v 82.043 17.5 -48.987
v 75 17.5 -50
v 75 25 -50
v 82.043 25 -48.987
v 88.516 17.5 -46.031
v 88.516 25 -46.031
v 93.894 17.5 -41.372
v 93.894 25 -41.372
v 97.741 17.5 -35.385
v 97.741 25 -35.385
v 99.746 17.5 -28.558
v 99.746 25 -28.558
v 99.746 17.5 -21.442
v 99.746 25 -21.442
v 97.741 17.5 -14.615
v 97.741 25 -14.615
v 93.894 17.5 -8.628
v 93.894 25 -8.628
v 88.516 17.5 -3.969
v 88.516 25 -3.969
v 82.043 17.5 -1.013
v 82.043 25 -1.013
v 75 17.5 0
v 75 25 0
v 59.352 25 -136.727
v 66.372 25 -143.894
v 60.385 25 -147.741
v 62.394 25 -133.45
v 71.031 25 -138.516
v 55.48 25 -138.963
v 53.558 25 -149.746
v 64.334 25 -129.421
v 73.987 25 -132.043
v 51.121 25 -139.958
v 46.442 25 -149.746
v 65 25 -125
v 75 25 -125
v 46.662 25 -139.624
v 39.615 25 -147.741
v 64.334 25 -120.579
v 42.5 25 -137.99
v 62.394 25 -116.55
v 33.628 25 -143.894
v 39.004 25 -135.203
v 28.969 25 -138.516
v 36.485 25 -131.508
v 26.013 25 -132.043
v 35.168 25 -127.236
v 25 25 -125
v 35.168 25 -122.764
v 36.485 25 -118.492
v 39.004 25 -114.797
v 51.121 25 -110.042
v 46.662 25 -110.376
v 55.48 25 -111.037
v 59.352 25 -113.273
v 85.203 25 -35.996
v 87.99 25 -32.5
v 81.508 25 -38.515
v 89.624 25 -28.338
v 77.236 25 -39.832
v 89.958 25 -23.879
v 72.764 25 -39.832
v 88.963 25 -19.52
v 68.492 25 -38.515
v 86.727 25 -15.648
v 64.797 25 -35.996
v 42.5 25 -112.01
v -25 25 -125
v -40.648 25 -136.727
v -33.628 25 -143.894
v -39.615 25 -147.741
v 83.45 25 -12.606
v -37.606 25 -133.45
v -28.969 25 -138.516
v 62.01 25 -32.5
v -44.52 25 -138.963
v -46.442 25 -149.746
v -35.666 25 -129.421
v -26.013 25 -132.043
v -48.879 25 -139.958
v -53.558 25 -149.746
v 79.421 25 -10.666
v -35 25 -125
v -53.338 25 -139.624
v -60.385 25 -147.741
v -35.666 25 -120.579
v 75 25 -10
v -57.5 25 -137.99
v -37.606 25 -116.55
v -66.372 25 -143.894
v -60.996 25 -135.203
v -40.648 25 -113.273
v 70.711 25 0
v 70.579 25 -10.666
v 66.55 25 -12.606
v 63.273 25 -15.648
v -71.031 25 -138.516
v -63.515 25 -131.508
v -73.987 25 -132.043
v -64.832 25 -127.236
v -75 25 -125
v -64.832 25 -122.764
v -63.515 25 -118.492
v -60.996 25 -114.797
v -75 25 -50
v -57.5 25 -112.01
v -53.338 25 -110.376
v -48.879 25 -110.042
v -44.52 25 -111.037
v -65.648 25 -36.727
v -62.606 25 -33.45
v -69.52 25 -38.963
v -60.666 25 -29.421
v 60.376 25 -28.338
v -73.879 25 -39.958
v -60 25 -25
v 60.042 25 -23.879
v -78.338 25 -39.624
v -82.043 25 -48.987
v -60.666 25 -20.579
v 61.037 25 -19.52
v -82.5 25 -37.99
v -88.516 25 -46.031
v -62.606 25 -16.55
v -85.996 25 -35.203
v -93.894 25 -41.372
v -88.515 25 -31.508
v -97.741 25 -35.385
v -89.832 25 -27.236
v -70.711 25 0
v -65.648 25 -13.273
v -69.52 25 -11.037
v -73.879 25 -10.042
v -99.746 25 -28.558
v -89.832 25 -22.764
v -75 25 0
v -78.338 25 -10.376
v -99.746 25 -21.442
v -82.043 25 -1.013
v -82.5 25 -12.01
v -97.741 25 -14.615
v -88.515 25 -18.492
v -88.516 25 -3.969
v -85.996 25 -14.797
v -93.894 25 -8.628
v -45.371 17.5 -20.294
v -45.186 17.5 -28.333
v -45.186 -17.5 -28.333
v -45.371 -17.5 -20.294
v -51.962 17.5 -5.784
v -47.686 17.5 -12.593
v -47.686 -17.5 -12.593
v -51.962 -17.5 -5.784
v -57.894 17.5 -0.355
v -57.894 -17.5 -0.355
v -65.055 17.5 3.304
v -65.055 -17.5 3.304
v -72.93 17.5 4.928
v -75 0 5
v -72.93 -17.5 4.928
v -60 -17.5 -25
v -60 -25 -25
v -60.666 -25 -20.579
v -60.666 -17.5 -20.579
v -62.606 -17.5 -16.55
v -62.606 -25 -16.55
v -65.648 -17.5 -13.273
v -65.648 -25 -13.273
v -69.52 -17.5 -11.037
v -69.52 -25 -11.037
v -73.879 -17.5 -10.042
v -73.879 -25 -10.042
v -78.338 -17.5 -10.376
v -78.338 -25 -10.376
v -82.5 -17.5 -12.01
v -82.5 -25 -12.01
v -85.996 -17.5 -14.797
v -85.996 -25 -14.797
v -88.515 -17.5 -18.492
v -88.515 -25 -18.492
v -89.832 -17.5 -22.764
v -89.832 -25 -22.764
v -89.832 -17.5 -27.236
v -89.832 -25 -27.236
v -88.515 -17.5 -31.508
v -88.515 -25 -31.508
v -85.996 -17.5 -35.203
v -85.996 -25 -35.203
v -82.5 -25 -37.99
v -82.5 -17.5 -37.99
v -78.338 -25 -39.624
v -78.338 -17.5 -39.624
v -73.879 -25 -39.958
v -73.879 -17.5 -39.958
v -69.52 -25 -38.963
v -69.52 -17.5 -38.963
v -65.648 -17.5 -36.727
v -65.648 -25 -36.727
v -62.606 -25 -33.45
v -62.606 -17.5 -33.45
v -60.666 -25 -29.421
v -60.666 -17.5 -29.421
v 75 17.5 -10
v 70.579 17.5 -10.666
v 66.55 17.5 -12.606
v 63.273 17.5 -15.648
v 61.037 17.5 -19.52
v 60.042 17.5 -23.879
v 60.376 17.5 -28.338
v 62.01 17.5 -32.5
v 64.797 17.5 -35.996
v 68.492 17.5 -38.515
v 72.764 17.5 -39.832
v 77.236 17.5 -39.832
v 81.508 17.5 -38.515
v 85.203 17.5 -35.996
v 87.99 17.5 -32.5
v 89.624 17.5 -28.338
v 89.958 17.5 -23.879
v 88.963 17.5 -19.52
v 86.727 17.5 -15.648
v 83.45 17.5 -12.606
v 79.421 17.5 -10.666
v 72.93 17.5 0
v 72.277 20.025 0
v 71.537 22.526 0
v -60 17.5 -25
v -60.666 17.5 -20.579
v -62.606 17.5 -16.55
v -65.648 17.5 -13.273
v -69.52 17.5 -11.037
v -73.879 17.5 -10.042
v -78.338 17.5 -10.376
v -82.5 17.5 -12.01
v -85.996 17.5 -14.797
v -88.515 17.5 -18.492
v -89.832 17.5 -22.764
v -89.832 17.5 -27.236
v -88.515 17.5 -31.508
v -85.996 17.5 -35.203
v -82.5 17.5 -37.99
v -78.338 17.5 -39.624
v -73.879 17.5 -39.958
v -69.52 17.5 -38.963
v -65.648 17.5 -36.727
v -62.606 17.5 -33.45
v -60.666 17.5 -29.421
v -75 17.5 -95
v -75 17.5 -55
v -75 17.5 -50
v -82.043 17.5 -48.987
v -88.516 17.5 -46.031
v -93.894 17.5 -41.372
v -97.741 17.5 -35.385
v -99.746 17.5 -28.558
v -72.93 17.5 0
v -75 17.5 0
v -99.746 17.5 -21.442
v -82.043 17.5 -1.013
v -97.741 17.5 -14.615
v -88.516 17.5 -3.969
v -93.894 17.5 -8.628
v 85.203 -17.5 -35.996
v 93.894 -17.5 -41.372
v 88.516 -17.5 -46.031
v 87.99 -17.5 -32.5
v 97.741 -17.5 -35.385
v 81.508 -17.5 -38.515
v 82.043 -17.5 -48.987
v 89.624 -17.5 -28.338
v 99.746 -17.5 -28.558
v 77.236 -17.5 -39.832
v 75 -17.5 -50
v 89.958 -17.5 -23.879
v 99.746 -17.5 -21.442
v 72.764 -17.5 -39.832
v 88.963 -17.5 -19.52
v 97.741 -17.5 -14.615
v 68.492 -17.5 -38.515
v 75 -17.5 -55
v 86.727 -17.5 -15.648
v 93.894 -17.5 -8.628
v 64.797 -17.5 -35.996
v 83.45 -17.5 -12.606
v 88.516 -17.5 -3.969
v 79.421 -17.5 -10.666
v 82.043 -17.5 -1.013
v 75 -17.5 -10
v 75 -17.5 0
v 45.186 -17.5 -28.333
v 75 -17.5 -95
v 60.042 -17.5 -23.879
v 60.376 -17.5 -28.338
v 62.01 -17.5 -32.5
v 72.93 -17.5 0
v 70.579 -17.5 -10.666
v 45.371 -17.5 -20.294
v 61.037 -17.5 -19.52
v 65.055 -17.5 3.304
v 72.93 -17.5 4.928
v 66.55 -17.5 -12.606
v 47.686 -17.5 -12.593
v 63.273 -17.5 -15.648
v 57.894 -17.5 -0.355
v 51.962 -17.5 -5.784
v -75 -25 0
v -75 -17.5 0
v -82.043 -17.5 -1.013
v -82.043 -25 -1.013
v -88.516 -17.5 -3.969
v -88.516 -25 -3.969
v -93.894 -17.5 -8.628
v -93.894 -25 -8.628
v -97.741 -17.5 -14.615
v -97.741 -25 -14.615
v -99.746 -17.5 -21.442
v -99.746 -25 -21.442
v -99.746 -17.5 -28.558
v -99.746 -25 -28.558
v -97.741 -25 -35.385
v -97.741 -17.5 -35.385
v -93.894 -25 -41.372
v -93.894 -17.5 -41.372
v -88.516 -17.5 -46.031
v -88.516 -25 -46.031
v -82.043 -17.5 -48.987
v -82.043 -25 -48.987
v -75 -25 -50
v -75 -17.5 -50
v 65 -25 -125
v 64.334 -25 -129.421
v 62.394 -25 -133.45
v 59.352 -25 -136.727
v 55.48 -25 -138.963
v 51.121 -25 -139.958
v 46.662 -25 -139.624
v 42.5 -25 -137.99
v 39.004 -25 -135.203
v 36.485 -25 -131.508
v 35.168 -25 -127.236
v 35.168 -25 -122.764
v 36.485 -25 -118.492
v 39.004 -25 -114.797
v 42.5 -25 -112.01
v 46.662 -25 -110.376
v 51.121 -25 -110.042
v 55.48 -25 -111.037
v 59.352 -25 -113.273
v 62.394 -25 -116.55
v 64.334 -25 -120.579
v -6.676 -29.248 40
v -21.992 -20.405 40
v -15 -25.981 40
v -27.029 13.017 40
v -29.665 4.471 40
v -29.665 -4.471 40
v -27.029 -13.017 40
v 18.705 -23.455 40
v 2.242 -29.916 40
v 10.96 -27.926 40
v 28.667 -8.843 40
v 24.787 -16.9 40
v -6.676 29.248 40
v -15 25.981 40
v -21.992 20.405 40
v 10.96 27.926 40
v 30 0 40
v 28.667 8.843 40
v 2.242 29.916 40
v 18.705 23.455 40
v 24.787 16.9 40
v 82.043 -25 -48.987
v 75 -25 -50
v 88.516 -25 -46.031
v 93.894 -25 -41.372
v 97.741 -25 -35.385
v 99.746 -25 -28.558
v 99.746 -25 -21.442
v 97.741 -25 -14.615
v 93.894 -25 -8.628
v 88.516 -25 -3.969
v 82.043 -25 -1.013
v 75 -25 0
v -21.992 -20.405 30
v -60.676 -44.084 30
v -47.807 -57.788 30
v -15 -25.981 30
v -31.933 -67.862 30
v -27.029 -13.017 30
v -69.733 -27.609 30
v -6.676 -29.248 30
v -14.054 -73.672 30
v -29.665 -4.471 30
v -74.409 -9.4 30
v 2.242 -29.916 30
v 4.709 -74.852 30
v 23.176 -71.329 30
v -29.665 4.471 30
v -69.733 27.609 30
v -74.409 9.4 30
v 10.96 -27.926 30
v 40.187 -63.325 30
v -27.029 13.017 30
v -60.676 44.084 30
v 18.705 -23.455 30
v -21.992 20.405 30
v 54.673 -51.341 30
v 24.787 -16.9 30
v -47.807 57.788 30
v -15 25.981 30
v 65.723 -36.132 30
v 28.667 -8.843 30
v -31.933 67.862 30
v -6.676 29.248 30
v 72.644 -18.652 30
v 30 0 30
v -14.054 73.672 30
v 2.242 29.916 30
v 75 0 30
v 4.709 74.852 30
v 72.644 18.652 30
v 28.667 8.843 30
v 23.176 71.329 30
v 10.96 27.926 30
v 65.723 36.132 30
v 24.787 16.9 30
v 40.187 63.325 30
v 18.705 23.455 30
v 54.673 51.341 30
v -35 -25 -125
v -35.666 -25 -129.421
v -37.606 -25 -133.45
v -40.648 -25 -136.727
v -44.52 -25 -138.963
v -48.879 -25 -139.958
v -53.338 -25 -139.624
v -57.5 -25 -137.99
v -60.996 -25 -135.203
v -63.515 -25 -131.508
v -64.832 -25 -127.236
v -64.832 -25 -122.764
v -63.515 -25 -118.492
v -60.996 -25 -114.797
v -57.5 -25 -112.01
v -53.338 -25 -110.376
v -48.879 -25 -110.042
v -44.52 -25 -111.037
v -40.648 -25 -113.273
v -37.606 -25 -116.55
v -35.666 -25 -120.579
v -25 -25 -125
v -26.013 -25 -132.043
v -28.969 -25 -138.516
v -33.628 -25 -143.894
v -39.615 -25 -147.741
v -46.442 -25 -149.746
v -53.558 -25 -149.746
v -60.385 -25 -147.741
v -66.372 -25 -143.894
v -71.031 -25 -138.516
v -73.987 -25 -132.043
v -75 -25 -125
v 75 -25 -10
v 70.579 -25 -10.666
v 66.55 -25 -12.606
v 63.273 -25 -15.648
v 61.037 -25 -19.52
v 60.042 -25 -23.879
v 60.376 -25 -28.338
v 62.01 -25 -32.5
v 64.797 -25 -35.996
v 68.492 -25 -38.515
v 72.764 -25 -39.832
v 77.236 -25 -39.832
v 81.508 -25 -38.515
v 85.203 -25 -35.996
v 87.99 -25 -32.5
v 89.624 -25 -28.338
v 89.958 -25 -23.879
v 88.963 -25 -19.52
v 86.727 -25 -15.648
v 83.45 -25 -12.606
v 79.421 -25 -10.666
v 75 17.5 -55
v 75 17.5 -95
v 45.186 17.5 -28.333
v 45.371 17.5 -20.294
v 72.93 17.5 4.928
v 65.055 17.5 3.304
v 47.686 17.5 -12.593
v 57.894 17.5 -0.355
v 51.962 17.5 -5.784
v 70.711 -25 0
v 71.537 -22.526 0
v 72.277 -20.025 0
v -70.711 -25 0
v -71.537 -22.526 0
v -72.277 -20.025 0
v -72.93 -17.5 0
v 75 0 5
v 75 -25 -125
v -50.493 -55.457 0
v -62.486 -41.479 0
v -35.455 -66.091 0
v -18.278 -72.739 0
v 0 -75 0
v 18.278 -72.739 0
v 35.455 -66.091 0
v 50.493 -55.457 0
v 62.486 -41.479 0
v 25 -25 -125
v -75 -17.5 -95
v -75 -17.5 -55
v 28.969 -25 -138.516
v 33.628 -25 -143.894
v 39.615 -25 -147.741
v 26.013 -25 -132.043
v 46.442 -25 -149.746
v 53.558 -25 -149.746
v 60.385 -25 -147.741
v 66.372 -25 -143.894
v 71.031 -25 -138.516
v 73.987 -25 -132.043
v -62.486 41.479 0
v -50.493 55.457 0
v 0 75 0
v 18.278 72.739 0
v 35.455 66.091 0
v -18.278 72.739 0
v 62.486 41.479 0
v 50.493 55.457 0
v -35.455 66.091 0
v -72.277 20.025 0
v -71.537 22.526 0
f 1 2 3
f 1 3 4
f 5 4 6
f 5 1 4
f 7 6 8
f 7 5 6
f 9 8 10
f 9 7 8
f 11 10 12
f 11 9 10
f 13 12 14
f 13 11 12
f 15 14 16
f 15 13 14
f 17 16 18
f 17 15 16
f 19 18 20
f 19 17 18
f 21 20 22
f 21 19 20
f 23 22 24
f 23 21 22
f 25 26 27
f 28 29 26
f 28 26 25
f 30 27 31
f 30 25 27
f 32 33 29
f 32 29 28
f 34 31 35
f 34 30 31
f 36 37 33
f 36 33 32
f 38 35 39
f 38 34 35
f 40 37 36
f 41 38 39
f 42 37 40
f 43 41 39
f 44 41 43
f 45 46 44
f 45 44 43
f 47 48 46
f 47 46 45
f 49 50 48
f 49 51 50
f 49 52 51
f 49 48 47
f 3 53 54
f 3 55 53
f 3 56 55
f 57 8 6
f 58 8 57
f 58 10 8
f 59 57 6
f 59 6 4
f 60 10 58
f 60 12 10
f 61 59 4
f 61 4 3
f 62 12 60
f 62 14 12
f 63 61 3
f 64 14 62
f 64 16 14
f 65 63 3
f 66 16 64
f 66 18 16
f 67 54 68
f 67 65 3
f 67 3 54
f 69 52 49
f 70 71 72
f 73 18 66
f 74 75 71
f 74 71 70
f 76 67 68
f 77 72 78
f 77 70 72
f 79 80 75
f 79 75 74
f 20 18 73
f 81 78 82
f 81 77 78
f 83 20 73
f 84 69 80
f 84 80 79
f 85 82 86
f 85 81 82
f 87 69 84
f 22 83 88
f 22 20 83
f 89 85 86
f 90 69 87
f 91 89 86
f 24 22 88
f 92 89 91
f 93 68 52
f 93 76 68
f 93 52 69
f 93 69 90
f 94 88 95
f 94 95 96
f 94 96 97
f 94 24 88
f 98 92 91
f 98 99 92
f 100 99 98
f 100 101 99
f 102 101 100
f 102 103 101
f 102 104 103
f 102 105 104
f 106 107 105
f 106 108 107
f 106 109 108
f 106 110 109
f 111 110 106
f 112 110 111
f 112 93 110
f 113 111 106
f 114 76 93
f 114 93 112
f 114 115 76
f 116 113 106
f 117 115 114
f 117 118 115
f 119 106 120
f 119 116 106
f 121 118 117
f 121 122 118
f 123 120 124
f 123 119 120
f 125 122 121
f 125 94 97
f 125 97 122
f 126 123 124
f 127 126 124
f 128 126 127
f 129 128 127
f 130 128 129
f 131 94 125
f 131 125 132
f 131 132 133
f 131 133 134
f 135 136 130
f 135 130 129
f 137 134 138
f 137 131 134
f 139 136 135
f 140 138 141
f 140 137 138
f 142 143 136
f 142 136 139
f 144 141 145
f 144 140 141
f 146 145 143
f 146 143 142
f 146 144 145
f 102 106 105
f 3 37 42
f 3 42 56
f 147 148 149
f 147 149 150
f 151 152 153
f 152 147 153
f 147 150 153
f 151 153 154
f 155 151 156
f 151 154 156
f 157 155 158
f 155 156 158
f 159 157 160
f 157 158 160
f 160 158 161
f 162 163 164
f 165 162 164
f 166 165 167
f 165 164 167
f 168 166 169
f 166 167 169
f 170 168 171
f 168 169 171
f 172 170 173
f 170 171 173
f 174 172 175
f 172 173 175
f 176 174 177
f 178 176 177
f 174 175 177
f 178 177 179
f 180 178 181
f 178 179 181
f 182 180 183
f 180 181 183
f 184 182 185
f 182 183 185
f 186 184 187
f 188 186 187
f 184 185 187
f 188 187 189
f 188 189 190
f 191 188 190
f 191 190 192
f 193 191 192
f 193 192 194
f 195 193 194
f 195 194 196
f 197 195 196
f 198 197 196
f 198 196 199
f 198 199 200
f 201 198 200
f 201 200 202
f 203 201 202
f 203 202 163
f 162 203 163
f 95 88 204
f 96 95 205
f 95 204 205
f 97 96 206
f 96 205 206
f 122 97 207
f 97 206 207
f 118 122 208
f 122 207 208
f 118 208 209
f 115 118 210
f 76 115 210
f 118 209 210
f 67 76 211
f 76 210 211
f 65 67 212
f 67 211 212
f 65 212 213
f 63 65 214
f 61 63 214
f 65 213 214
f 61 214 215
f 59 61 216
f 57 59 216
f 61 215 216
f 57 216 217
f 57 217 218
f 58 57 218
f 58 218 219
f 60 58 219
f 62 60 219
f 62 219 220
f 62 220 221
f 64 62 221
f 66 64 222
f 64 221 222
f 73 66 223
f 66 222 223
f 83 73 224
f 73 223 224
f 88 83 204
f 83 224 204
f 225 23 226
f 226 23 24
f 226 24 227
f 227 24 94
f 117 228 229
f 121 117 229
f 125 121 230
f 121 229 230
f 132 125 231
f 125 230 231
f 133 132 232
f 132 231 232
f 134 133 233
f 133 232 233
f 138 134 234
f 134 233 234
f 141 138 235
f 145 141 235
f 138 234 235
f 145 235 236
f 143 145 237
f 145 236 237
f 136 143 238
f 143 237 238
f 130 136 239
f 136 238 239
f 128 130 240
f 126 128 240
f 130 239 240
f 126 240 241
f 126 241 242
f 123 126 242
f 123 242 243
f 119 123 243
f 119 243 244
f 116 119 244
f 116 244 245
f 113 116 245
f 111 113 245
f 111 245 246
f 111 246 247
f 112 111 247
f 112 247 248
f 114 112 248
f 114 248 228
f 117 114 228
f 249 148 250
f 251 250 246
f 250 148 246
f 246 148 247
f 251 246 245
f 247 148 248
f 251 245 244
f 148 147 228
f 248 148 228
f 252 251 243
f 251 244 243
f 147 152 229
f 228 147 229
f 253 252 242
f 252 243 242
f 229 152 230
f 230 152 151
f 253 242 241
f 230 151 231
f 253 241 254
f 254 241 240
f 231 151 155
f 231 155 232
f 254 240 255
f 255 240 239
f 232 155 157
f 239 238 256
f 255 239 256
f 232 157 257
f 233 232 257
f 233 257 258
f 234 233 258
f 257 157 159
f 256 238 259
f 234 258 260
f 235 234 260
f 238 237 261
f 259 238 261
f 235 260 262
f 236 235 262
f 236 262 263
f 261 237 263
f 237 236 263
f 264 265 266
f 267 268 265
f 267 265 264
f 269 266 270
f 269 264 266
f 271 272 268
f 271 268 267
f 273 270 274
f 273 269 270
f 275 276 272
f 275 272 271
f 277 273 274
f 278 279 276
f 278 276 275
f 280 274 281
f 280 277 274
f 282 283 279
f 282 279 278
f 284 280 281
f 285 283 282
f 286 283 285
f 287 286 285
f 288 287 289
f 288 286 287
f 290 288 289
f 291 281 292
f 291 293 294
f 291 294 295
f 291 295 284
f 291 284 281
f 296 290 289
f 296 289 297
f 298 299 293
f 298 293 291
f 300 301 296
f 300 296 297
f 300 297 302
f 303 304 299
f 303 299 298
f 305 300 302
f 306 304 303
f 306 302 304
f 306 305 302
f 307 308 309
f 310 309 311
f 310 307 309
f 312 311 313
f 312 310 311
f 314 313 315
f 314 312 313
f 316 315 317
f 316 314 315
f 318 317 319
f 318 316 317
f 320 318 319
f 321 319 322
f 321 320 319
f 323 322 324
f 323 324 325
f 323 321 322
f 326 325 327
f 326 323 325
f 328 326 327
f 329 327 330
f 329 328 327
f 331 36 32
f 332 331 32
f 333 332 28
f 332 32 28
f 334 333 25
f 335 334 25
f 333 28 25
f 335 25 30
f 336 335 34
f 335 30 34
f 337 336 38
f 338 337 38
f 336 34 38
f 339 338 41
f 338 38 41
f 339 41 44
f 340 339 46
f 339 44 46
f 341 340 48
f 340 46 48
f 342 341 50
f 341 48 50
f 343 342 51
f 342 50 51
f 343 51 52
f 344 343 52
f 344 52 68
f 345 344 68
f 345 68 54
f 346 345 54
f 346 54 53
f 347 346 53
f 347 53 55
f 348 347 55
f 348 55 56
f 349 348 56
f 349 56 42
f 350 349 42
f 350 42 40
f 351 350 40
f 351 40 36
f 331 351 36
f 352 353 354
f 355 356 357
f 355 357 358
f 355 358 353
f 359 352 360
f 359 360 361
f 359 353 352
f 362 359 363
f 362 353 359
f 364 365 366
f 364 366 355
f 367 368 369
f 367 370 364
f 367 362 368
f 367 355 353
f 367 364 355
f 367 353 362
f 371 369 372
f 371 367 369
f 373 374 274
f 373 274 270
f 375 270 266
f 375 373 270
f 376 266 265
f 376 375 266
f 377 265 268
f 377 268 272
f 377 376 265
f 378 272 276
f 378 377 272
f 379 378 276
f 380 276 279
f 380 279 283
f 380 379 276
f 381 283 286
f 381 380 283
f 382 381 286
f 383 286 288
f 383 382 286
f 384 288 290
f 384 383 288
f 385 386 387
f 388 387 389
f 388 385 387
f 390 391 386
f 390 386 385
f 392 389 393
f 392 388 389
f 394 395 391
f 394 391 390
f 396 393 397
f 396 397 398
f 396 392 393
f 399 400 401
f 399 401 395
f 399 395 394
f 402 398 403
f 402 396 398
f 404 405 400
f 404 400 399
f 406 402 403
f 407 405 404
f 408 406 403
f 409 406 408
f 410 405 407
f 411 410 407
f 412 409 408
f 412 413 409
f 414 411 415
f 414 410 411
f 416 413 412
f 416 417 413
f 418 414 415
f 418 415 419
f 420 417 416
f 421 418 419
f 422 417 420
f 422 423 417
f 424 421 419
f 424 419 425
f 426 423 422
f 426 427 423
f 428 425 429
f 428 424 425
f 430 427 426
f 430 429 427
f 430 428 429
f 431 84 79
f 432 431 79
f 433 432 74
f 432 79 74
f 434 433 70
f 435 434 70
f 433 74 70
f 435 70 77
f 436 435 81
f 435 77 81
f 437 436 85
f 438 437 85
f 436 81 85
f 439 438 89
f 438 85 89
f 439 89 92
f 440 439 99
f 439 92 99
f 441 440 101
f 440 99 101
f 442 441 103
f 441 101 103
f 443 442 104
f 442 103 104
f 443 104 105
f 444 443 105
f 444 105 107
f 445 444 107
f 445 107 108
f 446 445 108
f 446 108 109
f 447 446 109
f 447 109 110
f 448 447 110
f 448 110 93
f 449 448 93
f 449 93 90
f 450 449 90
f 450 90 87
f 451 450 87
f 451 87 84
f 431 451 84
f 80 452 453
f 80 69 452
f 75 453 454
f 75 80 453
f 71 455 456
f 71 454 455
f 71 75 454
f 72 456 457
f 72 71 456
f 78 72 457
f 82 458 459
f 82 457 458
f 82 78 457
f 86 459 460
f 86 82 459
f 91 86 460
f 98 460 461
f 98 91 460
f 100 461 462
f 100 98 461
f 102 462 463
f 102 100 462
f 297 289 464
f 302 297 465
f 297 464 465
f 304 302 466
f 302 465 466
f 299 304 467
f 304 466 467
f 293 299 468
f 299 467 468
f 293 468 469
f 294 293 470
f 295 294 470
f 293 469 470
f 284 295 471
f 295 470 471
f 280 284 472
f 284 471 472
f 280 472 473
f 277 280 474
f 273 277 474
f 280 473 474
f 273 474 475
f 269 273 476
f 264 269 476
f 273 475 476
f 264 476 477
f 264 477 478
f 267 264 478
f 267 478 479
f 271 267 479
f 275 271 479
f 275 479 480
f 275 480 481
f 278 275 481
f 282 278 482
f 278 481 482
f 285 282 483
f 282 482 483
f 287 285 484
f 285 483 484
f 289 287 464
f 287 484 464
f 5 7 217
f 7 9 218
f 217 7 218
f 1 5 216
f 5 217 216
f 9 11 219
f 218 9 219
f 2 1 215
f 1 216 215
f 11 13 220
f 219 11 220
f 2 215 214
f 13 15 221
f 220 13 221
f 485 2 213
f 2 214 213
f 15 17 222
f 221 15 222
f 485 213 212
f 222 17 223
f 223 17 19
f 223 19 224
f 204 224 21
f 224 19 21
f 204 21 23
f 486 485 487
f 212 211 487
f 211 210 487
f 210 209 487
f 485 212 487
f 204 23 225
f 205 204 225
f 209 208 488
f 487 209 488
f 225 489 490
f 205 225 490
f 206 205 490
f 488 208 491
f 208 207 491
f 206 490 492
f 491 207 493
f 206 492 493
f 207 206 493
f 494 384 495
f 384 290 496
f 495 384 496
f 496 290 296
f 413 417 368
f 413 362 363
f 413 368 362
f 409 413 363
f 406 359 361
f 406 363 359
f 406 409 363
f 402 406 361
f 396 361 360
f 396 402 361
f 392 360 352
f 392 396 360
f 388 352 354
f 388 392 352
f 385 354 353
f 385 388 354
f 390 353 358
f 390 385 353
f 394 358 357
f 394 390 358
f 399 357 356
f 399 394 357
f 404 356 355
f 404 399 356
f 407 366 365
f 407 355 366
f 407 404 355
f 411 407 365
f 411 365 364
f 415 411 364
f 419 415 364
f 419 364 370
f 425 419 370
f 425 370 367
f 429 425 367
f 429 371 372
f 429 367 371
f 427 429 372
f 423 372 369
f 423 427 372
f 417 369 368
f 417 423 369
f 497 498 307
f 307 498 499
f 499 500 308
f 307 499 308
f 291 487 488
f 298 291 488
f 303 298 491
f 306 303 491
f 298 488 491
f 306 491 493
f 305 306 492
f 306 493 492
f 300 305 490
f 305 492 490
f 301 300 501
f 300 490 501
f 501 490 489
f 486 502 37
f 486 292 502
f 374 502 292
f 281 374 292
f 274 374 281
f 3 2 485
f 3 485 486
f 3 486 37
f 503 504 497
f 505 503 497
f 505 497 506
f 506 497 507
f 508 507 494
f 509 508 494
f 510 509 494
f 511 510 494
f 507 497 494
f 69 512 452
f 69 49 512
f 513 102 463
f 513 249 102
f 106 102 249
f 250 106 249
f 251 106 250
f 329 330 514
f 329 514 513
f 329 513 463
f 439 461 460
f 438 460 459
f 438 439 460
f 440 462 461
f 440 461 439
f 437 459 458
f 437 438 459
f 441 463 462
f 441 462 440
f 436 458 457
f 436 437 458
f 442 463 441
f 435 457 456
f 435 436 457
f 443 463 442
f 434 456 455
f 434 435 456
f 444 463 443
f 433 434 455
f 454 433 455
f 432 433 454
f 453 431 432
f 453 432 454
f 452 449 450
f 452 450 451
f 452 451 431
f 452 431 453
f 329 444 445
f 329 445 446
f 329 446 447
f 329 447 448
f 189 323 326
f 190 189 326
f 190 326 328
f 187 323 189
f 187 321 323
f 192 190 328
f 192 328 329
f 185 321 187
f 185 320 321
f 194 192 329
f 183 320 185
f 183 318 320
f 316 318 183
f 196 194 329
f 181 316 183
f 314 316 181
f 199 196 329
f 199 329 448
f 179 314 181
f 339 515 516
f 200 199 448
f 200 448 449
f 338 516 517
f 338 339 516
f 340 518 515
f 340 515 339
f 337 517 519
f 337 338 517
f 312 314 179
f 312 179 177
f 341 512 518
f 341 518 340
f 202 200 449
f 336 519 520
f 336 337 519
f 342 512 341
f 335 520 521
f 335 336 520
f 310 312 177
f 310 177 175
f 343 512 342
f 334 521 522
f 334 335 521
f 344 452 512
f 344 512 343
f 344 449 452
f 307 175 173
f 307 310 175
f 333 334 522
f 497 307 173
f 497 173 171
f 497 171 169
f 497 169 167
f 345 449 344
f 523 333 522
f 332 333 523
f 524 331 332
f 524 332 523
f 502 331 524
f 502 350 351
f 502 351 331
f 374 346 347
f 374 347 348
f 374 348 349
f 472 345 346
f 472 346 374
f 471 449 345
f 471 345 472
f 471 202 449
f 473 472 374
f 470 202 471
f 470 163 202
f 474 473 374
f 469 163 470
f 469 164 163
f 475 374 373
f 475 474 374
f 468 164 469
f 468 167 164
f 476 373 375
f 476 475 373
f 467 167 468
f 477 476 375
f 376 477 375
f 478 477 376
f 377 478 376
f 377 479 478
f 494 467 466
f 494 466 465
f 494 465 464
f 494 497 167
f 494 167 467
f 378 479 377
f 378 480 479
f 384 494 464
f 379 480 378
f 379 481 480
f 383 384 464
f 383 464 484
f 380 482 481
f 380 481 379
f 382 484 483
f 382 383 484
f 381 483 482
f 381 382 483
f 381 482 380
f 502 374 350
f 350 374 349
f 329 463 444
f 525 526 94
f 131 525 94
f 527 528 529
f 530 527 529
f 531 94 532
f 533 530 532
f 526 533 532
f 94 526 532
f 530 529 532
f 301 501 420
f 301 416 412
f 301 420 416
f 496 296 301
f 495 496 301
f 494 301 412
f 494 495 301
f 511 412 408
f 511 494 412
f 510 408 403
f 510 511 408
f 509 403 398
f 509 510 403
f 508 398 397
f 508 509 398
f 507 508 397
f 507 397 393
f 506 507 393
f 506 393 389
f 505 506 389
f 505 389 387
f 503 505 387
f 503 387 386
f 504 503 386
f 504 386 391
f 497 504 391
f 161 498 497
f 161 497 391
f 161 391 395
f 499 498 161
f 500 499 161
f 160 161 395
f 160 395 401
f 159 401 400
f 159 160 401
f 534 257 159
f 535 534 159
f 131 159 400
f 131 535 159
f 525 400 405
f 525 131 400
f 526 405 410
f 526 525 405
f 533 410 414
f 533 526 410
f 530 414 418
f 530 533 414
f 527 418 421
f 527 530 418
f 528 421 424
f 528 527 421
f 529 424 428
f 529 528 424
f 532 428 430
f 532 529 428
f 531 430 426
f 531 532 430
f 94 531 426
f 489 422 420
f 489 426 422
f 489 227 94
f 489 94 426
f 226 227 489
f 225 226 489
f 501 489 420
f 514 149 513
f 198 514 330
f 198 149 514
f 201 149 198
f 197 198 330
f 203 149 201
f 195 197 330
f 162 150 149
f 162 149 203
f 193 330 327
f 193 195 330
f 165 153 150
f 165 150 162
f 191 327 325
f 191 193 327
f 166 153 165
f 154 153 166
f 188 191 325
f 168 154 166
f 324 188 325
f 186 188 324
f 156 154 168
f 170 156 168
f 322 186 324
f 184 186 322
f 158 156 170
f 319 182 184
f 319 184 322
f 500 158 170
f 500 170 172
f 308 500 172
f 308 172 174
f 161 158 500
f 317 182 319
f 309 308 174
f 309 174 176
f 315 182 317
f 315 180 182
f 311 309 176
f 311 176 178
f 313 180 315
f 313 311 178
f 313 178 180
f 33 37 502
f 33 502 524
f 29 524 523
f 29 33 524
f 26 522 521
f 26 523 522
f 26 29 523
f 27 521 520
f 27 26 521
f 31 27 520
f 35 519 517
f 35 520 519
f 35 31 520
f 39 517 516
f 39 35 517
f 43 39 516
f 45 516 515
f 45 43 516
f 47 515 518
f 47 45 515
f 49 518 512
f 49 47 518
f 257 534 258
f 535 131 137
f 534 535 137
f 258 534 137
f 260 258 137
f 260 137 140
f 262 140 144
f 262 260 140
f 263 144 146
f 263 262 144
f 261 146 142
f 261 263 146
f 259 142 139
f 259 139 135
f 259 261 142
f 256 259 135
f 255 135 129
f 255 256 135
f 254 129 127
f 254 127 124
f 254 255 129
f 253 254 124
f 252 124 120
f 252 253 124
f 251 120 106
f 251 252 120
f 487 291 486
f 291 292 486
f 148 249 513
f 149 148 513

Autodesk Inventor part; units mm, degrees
ref_plane "YZ Plane" through (0, 0, 0) normal (1, 0, 0) x (0, 1, 0)
ref_plane "XZ Plane" through (0, 0, 0) normal (0, 1, 0) x (-1, 0, 0)
ref_plane "XY Plane" through (0, 0, 0) normal (0, 0, 1) x (1, 0, 0)
sketch "草图1" plane through (0, 0, 0) normal (0, 0, 1) x (1, 0, 0)
  circle A0 centre (0, 0) radius 75
  dimension "d0" = 150
extrude "拉伸1" add sketch "草图1" along normal blind 30
sketch "草图2" plane through (0, 0, 30) normal (0, 0, 1) x (1, 0, 0)
  circle A0 centre (0, 0) radius 30
  dimension "d3" = 60
extrude "拉伸2" add sketch "草图2" along normal blind 10
sketch "草图3" plane through (0, 0, 0) normal (0, 0, -1) x (-1, 0, 0)
  circle A0 centre (0, 0) radius 75 projected
  line L0 (-75, 25) -> (75, 25)
  line L1 (75, 25) -> (75, -25)
  line L2 (75, -25) -> (-75, -25)
  line L3 (-75, -25) -> (-75, 25)
  line L4 (-75, 25) -> (75, -25) construction
  line L5 (75, 25) -> (-75, -25) construction
  dimension "d21" = 50
  dimension "d22" = 150
extrude "拉伸3" add sketch "草图3" along normal blind 150 contours A0 L2 L0 | L1 L2 A0 | A0 L0 L1 | A0 L3 L0 | L2 L3 A0
sketch "草图4" plane through (-70, 25, 0) normal (0, 1, 0) x (1, 0, 0)
  circle A0 centre (120, 125) radius 15
  circle A1 centre (20, 125) radius 15
  line L0 (145, 0) -> (145, 150) projected
  arc A2 (145, 125) -> (95, 125) centre (120, 125) ccw
  line L1 (-5, 150) -> (145, 150) projected
  arc A3 (45, 125) -> (-5, 125) centre (20, 125) ccw
  line L2 (145, 125) -> (145, 150)
  line L3 (120, 150) -> (20, 150)
  line L4 (-5, 0) -> (-5, 150) projected
  line L5 (-5, 150) -> (20, 150)
  line L6 (-5, 150) -> (-5, 125)
  line L7 (95, 125) -> (45, 125)
  point P0 (70, 0)
  dimension "d12" = 30
  dimension "d13" = 30
  dimension "d23" = 100
  dimension "d24" = 25
extrude "拉伸4" cut sketch "草图4" against normal through all
sketch "草图5" plane through (-70.7107, -25, 0) normal (0, -1, 0) x (1, 0, 0)
  line L0 (-4.2893, 0) -> (-4.2893, -125) projected
  line L1 (145.7107, 0) -> (145.7107, -125) projected
  line L2 (0, 0) -> (141.4214, 0) projected
  circle A0 centre (-4.2893, -25) radius 25
  circle A1 centre (145.7107, -25) radius 25
  circle A2 centre (-4.2893, -25) radius 15
  circle A3 centre (145.7107, -25) radius 15
  point P0 (70.7107, 0)
  dimension "d34" = 30
  dimension "d35" = 30
extrude "拉伸5" add sketch "草图5" against normal up to surface (50 mm away) contours A0 L0 A2 | L0 A2 A0 | A1 L1 A3 | L1 A3 A1
extrude "拉伸6" cut sketch "草图5" against normal through all contours A2 L0 | L0 A2 | A3 L1 | L1 A3
sketch "草图6" plane through (0, 0, 0) normal (0, 1, 0) x (-1, 0, 0)
  circle A0 centre (75, -25) radius 15 projected
  circle A1 centre (75, -25) radius 30
  circle A2 centre (-75, -25) radius 15 projected
  circle A3 centre (-75, -25) radius 30
  point P0 (0, 0)
  dimension "d40" = 60
  dimension "d41" = 60
extrude "拉伸7" cut sketch "草图6" along normal mid plane 35
chamfer "倒角1" distance 40 angle 45 2 edges at (-75, 0, -55) (75, 0, -55)
equation "\"d36\" = d13"
equation "\"d38\" = d13"
properties part number "Pam" material "钢，高强度，低合金"
